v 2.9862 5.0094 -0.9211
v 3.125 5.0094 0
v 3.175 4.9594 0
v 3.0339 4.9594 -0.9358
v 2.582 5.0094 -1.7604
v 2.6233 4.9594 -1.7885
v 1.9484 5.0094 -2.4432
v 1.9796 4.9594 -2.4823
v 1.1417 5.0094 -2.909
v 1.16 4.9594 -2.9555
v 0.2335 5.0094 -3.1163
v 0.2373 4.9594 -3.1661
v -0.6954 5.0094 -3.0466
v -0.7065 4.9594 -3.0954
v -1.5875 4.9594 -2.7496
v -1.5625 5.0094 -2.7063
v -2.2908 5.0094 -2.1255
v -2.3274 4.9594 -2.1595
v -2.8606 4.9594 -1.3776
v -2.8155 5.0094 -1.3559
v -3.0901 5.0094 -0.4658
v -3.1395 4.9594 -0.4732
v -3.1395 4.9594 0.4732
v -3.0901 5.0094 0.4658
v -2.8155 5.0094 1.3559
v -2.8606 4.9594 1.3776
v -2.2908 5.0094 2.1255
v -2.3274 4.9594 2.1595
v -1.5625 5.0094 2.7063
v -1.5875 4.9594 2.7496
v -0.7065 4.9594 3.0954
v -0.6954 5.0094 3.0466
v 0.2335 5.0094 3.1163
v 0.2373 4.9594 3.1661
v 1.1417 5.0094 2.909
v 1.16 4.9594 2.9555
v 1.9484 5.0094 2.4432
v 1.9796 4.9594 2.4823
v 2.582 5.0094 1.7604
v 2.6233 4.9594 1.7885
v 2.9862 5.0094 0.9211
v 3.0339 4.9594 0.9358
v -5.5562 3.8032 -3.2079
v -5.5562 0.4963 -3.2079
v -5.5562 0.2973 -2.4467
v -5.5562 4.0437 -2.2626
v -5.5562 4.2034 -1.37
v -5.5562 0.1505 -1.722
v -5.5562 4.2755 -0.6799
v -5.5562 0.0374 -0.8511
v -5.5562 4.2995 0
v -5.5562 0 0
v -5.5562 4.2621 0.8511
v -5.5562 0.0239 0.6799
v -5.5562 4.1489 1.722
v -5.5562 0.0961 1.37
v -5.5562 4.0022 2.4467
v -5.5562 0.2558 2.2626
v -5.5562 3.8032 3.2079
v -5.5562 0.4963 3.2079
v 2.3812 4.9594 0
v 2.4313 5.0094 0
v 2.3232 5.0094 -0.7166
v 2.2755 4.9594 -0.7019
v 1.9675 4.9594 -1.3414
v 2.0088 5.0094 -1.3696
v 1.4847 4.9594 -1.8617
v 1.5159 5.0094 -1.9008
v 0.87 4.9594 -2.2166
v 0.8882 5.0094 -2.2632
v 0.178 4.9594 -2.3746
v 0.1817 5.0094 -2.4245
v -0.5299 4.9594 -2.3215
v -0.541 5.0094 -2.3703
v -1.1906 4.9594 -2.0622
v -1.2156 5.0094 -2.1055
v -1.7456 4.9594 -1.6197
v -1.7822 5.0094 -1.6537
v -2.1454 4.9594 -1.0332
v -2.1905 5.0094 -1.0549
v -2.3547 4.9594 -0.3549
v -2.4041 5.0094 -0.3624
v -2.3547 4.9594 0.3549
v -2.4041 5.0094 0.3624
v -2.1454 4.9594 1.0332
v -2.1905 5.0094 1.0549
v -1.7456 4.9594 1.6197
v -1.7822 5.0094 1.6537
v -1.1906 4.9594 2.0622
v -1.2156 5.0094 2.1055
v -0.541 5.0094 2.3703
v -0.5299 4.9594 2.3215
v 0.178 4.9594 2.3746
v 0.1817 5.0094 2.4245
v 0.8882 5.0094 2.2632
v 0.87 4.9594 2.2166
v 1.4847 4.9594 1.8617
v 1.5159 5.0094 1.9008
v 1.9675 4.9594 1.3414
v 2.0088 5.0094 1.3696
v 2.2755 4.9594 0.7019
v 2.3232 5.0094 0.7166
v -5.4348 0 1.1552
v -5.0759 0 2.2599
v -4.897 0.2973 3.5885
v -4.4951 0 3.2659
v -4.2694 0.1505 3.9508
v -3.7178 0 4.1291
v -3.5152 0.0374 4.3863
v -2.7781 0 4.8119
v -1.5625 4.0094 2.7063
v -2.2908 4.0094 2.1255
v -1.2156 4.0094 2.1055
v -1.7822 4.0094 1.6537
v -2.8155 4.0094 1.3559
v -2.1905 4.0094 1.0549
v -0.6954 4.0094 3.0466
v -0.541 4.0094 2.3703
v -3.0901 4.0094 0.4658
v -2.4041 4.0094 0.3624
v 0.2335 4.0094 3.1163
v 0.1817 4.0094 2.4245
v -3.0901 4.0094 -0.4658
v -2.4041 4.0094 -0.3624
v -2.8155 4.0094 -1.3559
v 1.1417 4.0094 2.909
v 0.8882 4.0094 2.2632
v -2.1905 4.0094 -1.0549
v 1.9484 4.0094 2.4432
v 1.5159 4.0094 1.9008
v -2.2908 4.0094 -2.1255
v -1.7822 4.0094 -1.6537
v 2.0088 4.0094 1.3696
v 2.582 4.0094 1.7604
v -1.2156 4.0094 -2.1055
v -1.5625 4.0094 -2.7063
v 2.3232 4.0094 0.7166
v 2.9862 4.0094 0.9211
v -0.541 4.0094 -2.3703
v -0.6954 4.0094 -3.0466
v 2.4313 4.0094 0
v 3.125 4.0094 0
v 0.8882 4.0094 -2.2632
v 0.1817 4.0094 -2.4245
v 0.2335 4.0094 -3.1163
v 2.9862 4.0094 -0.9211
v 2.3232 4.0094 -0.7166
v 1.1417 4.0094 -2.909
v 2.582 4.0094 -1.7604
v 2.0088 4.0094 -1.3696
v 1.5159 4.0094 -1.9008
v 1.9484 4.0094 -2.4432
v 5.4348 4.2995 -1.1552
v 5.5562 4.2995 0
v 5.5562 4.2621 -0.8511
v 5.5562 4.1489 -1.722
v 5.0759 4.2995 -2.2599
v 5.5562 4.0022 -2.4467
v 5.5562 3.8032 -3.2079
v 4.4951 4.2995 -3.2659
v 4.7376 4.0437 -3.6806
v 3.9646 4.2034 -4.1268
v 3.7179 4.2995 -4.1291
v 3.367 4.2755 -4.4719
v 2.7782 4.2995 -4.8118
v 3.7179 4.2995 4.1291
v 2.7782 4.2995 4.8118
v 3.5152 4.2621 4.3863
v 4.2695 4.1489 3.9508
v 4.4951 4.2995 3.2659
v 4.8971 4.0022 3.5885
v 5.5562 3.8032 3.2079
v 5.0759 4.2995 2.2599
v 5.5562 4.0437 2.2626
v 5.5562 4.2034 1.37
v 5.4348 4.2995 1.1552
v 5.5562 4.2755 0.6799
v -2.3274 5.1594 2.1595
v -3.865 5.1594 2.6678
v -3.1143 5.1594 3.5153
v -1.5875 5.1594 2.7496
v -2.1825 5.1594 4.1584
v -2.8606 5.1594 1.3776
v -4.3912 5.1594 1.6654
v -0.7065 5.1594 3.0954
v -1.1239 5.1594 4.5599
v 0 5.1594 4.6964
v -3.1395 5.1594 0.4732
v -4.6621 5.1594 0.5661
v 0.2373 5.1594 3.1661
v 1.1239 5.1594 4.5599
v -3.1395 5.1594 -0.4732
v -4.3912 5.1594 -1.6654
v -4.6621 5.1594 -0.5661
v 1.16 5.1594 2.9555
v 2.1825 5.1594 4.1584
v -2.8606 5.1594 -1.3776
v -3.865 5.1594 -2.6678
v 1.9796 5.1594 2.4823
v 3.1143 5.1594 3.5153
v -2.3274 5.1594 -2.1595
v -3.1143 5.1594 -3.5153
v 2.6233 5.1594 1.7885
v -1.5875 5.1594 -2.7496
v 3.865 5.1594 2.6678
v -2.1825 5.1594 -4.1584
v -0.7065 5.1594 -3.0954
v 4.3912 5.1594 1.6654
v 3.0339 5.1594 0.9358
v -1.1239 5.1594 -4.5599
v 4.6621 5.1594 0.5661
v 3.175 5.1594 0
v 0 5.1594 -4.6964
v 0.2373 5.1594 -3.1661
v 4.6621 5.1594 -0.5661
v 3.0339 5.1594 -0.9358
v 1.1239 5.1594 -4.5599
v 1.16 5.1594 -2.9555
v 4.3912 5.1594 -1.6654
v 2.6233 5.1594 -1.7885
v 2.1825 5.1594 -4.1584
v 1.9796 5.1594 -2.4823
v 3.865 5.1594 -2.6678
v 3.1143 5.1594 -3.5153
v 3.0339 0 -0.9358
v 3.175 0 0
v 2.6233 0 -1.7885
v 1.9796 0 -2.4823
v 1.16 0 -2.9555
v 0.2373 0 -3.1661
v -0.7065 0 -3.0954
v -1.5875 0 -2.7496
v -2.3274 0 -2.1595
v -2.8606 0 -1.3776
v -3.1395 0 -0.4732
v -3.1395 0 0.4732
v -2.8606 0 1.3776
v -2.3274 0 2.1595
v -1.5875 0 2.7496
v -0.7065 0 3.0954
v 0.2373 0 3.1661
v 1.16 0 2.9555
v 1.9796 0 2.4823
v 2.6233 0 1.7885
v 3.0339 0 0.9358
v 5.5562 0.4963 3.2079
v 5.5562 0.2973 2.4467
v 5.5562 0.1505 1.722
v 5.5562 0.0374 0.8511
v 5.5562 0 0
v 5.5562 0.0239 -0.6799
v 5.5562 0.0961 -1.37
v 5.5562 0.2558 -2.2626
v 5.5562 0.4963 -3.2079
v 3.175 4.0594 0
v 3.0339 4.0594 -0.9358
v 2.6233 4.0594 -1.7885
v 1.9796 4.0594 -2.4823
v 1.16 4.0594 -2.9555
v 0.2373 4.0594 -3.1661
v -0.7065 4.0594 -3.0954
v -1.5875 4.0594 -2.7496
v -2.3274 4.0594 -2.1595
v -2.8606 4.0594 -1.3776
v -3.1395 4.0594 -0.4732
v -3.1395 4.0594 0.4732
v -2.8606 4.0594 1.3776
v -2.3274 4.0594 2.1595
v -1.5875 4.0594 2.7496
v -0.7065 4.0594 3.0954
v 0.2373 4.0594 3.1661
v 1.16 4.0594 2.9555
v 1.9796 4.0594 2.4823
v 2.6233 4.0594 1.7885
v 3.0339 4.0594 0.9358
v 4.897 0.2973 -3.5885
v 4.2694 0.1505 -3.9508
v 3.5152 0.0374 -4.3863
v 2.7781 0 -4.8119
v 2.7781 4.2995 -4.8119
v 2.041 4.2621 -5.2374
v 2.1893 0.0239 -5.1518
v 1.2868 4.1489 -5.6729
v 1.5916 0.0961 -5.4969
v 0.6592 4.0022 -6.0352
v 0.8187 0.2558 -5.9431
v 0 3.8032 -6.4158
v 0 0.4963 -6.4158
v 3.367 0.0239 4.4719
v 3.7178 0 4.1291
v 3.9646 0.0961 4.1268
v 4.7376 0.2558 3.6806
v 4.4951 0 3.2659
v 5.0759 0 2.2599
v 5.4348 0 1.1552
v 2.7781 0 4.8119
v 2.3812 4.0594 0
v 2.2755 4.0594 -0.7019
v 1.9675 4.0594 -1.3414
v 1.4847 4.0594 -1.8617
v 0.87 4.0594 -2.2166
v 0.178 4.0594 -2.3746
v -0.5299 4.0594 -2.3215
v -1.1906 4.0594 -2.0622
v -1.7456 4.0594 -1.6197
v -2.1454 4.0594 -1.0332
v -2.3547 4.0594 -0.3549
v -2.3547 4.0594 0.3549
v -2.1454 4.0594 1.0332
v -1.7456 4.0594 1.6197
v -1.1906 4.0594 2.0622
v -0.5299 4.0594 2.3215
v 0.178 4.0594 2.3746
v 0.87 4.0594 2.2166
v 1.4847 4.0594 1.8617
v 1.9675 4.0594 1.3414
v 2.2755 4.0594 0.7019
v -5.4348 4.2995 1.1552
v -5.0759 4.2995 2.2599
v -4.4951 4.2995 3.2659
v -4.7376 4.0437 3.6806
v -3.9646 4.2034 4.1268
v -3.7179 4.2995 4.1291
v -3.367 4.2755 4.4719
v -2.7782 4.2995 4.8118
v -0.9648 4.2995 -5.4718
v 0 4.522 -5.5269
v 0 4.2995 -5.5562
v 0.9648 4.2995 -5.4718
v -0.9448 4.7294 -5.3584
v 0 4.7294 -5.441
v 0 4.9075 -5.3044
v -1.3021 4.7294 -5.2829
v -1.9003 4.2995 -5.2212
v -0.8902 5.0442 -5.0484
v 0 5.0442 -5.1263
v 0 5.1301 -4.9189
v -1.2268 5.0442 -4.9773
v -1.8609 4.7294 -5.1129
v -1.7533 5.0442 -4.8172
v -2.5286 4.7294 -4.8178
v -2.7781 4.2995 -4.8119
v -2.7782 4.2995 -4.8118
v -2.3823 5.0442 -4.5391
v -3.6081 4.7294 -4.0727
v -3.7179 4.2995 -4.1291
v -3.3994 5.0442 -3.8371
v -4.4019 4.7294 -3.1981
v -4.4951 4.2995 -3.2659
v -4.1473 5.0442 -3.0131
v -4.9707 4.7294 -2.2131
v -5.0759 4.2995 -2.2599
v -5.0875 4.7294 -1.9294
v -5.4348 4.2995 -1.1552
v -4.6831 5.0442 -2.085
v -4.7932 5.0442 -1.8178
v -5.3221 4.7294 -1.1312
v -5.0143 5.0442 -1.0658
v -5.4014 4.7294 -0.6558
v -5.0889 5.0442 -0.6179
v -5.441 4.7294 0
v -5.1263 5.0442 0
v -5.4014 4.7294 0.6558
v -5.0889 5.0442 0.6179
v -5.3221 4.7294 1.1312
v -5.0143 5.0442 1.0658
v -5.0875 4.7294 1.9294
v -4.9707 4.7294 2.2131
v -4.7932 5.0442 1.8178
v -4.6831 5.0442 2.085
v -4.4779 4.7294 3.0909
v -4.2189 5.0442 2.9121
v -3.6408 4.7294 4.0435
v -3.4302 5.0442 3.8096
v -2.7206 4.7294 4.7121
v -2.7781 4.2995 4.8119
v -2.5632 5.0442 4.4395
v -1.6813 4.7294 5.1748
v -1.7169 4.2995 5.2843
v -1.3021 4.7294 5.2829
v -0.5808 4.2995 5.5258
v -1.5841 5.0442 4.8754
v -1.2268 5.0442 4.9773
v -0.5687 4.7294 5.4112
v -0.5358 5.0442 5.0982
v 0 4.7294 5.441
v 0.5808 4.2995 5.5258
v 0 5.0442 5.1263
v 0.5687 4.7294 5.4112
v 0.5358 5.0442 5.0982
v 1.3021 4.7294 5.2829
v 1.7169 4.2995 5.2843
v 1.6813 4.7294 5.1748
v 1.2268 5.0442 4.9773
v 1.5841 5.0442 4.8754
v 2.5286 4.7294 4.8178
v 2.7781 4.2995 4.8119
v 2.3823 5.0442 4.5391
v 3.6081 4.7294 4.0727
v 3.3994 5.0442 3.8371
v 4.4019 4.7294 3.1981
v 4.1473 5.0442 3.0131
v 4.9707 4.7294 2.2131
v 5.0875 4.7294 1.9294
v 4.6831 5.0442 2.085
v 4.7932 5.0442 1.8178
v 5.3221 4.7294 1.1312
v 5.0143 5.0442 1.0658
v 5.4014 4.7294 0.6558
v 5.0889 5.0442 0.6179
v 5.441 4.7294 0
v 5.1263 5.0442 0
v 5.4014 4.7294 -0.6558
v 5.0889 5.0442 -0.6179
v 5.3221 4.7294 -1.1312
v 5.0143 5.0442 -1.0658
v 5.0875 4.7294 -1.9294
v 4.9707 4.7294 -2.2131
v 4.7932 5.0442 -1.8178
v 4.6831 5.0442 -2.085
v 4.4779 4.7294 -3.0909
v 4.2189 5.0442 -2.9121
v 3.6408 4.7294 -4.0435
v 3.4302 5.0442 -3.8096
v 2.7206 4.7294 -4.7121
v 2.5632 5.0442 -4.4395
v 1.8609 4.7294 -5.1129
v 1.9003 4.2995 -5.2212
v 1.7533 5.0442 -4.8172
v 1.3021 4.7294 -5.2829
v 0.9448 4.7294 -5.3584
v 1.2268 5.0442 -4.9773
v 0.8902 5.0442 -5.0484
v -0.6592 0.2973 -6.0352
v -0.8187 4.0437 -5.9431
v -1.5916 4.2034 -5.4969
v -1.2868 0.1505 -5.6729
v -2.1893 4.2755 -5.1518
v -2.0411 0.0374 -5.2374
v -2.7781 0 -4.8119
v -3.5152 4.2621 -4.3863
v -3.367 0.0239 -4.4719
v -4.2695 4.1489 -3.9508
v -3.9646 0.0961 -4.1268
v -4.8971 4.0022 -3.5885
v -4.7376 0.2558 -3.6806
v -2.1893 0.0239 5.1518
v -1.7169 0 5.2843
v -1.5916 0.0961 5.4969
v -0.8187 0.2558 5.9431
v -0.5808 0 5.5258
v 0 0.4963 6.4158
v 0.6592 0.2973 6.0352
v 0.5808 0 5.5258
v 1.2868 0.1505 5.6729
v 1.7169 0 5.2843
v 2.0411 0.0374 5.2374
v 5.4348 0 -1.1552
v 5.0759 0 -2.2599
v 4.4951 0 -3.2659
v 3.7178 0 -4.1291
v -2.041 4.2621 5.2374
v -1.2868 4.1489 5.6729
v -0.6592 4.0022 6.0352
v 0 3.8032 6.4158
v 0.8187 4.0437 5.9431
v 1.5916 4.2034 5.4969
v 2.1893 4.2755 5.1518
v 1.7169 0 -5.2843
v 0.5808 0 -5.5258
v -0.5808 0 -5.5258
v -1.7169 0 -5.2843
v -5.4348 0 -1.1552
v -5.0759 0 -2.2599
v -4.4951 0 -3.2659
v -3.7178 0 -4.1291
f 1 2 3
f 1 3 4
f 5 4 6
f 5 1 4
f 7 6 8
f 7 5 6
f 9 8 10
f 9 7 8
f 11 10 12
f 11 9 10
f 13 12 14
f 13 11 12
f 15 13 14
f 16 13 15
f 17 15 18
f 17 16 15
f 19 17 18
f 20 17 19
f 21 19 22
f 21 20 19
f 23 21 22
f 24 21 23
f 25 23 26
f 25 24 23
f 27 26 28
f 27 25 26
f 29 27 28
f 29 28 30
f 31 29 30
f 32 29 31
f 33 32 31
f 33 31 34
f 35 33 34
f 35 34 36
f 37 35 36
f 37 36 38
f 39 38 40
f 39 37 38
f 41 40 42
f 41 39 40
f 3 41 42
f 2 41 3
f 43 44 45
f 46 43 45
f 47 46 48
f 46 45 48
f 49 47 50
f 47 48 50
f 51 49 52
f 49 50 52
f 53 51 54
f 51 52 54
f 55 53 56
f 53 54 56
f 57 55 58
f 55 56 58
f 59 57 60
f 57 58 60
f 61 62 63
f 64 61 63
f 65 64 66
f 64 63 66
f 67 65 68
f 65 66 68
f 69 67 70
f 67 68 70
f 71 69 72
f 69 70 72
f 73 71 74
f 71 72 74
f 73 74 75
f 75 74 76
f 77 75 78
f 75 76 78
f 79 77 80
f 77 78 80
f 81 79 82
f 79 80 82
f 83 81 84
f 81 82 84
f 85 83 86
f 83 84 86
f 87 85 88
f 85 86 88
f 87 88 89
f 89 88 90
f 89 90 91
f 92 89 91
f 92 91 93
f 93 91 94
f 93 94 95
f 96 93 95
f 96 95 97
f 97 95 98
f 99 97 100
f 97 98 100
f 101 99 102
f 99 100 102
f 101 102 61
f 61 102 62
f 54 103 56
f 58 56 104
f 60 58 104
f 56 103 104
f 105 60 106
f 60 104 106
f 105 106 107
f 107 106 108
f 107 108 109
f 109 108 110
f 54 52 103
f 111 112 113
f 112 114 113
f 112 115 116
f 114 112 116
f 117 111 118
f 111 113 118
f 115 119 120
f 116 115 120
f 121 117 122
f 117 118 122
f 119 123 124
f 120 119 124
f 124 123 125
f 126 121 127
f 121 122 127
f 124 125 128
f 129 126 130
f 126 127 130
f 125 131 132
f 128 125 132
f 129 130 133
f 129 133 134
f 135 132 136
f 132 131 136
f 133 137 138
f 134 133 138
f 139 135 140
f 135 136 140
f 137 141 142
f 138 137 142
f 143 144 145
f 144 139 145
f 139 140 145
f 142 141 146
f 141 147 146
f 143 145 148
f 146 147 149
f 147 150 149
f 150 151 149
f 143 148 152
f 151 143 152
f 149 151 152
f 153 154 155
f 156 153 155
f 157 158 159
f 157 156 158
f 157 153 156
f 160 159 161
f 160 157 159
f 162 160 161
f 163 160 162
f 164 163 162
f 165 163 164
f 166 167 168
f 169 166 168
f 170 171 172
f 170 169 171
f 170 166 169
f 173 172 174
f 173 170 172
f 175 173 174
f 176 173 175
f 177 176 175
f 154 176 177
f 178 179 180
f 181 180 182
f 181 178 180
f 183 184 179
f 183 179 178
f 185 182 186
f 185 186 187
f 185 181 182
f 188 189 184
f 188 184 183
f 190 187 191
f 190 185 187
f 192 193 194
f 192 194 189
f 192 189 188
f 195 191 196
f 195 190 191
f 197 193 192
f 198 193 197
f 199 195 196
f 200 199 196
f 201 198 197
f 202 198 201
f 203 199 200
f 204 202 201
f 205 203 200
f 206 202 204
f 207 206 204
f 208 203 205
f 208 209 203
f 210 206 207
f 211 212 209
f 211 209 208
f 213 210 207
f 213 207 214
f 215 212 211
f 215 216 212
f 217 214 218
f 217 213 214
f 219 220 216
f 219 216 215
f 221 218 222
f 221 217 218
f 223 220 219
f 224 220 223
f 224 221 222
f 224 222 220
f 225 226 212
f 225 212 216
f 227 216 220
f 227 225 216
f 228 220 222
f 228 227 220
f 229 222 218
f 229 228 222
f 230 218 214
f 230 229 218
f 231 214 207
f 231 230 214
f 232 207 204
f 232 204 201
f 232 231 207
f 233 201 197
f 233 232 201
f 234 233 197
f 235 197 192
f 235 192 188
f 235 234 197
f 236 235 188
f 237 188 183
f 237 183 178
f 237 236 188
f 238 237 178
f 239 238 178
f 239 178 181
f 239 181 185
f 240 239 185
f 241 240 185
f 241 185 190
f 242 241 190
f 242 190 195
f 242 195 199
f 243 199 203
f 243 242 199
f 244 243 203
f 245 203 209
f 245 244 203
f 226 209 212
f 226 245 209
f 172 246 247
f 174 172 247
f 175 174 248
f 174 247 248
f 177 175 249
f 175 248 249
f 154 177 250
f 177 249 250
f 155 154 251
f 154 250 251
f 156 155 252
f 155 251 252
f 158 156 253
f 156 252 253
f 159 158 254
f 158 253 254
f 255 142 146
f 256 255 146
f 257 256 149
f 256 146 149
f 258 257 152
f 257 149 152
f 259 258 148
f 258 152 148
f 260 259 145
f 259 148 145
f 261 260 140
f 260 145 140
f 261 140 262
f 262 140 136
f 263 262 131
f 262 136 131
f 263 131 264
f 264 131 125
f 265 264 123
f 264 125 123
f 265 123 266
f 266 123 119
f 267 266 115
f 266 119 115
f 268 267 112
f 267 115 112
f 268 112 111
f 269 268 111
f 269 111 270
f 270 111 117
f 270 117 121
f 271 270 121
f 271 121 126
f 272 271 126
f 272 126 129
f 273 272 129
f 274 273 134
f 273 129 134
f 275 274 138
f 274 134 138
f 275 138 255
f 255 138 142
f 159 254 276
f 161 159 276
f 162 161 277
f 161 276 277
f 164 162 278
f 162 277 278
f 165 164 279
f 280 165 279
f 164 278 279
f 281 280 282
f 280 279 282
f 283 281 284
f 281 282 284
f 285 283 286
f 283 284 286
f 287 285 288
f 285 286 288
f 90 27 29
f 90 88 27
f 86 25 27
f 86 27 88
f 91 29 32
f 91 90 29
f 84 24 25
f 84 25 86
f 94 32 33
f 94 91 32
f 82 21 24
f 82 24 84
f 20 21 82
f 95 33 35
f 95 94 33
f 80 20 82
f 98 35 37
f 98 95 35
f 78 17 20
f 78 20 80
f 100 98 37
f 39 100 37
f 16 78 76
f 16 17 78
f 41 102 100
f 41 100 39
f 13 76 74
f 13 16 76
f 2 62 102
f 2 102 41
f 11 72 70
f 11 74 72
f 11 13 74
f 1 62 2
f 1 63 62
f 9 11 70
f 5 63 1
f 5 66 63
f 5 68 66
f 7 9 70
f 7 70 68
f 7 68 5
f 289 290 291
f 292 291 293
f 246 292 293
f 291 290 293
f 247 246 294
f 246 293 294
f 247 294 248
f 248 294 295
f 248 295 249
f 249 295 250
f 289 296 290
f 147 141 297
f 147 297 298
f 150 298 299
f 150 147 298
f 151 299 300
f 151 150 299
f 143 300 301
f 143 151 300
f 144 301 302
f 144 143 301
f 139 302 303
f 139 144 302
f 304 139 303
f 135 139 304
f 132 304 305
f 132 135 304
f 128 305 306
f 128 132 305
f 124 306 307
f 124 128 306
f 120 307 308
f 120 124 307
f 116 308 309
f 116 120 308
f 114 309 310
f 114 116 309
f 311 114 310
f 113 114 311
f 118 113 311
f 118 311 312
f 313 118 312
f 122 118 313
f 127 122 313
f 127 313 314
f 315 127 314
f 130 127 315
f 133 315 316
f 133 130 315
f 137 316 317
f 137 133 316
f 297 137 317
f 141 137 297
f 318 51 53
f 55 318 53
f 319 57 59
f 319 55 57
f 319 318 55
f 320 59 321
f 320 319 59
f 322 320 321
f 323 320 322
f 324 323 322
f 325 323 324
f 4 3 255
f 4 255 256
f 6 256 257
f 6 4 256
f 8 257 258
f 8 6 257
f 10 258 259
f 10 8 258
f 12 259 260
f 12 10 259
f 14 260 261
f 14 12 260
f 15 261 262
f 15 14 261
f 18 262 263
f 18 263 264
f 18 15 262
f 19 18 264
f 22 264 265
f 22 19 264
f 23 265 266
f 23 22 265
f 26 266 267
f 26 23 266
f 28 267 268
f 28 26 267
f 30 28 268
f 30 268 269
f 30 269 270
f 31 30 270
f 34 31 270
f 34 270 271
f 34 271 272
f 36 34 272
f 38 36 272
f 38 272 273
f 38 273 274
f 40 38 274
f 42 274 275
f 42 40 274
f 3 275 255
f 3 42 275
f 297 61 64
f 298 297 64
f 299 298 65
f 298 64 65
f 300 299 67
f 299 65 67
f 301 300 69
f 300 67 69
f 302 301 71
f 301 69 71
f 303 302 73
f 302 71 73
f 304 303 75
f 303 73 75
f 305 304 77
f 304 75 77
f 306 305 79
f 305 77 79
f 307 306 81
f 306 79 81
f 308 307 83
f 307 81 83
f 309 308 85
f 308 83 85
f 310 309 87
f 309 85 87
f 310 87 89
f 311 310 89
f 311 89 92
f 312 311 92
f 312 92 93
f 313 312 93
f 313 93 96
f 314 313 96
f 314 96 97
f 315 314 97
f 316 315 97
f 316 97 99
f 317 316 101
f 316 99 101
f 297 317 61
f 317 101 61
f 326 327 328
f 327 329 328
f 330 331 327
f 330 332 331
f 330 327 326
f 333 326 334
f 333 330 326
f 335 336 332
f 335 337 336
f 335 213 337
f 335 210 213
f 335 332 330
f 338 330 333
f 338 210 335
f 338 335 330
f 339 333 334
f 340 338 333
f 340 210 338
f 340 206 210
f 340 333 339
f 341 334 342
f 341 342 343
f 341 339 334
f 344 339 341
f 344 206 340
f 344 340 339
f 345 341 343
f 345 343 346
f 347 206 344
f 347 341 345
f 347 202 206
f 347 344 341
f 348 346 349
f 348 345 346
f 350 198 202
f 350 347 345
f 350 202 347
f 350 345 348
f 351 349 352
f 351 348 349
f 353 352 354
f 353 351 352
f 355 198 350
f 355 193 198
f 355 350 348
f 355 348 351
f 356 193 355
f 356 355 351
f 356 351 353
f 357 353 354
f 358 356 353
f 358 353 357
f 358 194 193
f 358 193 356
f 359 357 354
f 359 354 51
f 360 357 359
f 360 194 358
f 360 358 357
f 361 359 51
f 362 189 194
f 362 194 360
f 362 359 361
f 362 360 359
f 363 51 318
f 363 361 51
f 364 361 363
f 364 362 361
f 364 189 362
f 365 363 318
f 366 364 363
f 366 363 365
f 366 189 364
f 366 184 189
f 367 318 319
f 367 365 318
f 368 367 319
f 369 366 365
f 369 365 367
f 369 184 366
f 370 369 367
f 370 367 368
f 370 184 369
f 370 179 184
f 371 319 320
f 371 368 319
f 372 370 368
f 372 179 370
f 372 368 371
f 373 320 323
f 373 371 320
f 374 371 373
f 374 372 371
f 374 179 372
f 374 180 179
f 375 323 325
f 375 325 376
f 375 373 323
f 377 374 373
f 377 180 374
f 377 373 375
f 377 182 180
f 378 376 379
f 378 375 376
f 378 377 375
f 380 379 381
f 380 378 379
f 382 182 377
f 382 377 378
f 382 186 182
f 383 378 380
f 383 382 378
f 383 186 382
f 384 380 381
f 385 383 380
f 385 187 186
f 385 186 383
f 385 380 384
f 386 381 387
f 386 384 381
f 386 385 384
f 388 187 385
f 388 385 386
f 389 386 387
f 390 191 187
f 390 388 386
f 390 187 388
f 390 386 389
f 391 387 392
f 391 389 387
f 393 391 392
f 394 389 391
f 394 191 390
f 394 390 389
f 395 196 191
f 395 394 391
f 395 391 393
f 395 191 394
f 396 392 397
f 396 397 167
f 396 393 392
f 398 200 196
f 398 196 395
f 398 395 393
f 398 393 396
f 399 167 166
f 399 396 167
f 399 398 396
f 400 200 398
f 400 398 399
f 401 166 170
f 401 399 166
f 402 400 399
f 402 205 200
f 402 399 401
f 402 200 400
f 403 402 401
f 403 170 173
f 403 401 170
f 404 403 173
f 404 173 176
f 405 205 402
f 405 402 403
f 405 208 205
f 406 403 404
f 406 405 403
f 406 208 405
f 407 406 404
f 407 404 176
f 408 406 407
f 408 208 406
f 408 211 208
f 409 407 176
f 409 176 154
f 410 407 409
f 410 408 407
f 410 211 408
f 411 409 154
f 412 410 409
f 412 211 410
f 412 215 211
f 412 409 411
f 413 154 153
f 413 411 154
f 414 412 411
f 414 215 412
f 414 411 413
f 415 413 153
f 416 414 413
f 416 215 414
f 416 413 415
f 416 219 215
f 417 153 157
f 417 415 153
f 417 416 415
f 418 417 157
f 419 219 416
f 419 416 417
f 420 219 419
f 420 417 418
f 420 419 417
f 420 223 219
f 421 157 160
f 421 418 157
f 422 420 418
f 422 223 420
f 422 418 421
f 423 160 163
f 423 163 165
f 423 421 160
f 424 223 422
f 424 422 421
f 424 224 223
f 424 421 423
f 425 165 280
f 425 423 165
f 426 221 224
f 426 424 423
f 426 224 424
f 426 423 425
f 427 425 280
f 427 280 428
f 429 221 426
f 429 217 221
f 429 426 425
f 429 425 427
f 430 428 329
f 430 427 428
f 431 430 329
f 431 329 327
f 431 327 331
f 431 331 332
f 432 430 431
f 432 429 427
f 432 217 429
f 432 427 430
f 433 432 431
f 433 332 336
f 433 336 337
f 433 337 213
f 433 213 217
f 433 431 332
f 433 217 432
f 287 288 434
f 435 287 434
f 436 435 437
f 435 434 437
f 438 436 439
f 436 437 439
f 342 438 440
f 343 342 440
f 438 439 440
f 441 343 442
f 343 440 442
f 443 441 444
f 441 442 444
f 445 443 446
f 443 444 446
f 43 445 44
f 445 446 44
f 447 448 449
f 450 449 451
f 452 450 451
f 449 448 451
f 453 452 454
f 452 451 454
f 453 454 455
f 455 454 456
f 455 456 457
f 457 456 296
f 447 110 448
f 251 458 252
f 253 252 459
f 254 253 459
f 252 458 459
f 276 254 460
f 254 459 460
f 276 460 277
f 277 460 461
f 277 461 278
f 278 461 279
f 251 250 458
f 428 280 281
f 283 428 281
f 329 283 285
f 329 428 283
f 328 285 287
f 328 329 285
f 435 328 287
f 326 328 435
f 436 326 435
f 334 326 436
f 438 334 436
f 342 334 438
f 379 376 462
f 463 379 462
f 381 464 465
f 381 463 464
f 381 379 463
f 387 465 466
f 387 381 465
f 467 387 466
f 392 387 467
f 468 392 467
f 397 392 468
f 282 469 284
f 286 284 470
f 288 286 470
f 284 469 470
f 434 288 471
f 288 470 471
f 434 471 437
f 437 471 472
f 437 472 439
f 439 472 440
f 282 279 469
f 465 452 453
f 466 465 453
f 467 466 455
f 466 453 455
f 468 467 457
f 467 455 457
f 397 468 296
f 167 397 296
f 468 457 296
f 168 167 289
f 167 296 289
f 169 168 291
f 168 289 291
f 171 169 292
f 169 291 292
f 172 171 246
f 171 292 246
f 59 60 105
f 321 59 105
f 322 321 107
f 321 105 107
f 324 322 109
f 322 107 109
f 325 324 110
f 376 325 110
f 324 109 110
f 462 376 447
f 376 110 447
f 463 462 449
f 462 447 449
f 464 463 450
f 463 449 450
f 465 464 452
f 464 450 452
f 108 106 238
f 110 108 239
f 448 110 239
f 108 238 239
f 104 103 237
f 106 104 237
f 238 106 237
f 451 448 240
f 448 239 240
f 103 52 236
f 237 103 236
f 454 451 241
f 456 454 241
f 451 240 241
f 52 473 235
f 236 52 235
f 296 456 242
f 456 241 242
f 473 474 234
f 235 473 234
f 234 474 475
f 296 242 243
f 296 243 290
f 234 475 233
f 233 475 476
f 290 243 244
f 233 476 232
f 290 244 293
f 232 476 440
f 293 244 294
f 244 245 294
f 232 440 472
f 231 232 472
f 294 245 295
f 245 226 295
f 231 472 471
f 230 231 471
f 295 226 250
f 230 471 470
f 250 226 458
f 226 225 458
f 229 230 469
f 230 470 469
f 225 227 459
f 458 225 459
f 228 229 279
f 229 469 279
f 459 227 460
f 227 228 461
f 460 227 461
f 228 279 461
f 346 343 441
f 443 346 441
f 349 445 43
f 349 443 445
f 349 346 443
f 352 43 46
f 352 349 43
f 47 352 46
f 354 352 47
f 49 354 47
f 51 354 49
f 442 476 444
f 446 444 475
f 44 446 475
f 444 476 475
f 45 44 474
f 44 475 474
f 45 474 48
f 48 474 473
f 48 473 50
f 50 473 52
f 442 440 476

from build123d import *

# Parameters (mm, degrees)
SKETCH1_R           = 3.175
EXTRUDE1_DEPTH      = 5.159375
EXTRUDE_THIN1_START = -0.15
SKETCH3_R           = 3.175
SKETCH3_R_2         = 2.38125
EXTRUDE_THIN1_DEPTH = 1
CHAMFER1_SIZE       = 0.05


with BuildPart() as part:
    # Sketch1 → Extrude1 (new body)
    with BuildSketch(Plane(origin=(0, 0, 0), x_dir=(1, 0, 0), z_dir=(0, 1, 0))):
        Polygon((0, 6.415804866), (-5.55625, 3.207902433), (-5.55625, -3.207902433), (0, -6.415804866), (5.55625, -3.207902433), (5.55625, 3.207902433), align=None)
        Circle(SKETCH1_R, mode=Mode.SUBTRACT)
    extrude(amount=EXTRUDE1_DEPTH)

    # Sketch2 → Cut-Revolve1 (revolve, cut)
    with BuildSketch(Plane(origin=(0, 0, 0), x_dir=(0, 0, -1), z_dir=(1, 0, 0))):
        with BuildLine():
            Line((6.415804866, 5.159375), (6.415804866, 3.803214933))
            Line((6.415804866, 3.803214933), (5.55625, 4.299479167))
            ThreePointArc((5.55625, 4.299479167), (5.304392342, 4.907517342), (4.696354167, 5.159375))
            Line((4.696354167, 5.159375), (6.415804866, 5.159375))
        make_face()
        Polygon((6.415804866, 0.496264233), (5.55625, 0), (6.415804866, 0), align=None)
    revolve(axis=Axis((0, 0, 0), (0, 1, 0)), mode=Mode.SUBTRACT)


with BuildPart() as body_2:
    # Sketch3 → Extrude-Thin1 (new body)
    with BuildSketch(Plane(origin=(0, 5.159375, 0), x_dir=(1, 0, 0), z_dir=(0, 1, 0)).offset(EXTRUDE_THIN1_START)):
        Circle(SKETCH3_R)
        Circle(SKETCH3_R_2, mode=Mode.SUBTRACT)
    extrude(amount=-EXTRUDE_THIN1_DEPTH)

    # Chamfer1
    chamfer1_edges = [body_2.edges().sort_by_distance(p)[0] for p in [
        (-3.175, 5.009375, 0),
        (-3.175, 4.009375, 0),
        (-2.38125, 4.009375, 0),
        (-2.38125, 5.009375, 0),
    ]]
    chamfer(chamfer1_edges, length=CHAMFER1_SIZE)


solid = Compound([part.part, body_2.part])
